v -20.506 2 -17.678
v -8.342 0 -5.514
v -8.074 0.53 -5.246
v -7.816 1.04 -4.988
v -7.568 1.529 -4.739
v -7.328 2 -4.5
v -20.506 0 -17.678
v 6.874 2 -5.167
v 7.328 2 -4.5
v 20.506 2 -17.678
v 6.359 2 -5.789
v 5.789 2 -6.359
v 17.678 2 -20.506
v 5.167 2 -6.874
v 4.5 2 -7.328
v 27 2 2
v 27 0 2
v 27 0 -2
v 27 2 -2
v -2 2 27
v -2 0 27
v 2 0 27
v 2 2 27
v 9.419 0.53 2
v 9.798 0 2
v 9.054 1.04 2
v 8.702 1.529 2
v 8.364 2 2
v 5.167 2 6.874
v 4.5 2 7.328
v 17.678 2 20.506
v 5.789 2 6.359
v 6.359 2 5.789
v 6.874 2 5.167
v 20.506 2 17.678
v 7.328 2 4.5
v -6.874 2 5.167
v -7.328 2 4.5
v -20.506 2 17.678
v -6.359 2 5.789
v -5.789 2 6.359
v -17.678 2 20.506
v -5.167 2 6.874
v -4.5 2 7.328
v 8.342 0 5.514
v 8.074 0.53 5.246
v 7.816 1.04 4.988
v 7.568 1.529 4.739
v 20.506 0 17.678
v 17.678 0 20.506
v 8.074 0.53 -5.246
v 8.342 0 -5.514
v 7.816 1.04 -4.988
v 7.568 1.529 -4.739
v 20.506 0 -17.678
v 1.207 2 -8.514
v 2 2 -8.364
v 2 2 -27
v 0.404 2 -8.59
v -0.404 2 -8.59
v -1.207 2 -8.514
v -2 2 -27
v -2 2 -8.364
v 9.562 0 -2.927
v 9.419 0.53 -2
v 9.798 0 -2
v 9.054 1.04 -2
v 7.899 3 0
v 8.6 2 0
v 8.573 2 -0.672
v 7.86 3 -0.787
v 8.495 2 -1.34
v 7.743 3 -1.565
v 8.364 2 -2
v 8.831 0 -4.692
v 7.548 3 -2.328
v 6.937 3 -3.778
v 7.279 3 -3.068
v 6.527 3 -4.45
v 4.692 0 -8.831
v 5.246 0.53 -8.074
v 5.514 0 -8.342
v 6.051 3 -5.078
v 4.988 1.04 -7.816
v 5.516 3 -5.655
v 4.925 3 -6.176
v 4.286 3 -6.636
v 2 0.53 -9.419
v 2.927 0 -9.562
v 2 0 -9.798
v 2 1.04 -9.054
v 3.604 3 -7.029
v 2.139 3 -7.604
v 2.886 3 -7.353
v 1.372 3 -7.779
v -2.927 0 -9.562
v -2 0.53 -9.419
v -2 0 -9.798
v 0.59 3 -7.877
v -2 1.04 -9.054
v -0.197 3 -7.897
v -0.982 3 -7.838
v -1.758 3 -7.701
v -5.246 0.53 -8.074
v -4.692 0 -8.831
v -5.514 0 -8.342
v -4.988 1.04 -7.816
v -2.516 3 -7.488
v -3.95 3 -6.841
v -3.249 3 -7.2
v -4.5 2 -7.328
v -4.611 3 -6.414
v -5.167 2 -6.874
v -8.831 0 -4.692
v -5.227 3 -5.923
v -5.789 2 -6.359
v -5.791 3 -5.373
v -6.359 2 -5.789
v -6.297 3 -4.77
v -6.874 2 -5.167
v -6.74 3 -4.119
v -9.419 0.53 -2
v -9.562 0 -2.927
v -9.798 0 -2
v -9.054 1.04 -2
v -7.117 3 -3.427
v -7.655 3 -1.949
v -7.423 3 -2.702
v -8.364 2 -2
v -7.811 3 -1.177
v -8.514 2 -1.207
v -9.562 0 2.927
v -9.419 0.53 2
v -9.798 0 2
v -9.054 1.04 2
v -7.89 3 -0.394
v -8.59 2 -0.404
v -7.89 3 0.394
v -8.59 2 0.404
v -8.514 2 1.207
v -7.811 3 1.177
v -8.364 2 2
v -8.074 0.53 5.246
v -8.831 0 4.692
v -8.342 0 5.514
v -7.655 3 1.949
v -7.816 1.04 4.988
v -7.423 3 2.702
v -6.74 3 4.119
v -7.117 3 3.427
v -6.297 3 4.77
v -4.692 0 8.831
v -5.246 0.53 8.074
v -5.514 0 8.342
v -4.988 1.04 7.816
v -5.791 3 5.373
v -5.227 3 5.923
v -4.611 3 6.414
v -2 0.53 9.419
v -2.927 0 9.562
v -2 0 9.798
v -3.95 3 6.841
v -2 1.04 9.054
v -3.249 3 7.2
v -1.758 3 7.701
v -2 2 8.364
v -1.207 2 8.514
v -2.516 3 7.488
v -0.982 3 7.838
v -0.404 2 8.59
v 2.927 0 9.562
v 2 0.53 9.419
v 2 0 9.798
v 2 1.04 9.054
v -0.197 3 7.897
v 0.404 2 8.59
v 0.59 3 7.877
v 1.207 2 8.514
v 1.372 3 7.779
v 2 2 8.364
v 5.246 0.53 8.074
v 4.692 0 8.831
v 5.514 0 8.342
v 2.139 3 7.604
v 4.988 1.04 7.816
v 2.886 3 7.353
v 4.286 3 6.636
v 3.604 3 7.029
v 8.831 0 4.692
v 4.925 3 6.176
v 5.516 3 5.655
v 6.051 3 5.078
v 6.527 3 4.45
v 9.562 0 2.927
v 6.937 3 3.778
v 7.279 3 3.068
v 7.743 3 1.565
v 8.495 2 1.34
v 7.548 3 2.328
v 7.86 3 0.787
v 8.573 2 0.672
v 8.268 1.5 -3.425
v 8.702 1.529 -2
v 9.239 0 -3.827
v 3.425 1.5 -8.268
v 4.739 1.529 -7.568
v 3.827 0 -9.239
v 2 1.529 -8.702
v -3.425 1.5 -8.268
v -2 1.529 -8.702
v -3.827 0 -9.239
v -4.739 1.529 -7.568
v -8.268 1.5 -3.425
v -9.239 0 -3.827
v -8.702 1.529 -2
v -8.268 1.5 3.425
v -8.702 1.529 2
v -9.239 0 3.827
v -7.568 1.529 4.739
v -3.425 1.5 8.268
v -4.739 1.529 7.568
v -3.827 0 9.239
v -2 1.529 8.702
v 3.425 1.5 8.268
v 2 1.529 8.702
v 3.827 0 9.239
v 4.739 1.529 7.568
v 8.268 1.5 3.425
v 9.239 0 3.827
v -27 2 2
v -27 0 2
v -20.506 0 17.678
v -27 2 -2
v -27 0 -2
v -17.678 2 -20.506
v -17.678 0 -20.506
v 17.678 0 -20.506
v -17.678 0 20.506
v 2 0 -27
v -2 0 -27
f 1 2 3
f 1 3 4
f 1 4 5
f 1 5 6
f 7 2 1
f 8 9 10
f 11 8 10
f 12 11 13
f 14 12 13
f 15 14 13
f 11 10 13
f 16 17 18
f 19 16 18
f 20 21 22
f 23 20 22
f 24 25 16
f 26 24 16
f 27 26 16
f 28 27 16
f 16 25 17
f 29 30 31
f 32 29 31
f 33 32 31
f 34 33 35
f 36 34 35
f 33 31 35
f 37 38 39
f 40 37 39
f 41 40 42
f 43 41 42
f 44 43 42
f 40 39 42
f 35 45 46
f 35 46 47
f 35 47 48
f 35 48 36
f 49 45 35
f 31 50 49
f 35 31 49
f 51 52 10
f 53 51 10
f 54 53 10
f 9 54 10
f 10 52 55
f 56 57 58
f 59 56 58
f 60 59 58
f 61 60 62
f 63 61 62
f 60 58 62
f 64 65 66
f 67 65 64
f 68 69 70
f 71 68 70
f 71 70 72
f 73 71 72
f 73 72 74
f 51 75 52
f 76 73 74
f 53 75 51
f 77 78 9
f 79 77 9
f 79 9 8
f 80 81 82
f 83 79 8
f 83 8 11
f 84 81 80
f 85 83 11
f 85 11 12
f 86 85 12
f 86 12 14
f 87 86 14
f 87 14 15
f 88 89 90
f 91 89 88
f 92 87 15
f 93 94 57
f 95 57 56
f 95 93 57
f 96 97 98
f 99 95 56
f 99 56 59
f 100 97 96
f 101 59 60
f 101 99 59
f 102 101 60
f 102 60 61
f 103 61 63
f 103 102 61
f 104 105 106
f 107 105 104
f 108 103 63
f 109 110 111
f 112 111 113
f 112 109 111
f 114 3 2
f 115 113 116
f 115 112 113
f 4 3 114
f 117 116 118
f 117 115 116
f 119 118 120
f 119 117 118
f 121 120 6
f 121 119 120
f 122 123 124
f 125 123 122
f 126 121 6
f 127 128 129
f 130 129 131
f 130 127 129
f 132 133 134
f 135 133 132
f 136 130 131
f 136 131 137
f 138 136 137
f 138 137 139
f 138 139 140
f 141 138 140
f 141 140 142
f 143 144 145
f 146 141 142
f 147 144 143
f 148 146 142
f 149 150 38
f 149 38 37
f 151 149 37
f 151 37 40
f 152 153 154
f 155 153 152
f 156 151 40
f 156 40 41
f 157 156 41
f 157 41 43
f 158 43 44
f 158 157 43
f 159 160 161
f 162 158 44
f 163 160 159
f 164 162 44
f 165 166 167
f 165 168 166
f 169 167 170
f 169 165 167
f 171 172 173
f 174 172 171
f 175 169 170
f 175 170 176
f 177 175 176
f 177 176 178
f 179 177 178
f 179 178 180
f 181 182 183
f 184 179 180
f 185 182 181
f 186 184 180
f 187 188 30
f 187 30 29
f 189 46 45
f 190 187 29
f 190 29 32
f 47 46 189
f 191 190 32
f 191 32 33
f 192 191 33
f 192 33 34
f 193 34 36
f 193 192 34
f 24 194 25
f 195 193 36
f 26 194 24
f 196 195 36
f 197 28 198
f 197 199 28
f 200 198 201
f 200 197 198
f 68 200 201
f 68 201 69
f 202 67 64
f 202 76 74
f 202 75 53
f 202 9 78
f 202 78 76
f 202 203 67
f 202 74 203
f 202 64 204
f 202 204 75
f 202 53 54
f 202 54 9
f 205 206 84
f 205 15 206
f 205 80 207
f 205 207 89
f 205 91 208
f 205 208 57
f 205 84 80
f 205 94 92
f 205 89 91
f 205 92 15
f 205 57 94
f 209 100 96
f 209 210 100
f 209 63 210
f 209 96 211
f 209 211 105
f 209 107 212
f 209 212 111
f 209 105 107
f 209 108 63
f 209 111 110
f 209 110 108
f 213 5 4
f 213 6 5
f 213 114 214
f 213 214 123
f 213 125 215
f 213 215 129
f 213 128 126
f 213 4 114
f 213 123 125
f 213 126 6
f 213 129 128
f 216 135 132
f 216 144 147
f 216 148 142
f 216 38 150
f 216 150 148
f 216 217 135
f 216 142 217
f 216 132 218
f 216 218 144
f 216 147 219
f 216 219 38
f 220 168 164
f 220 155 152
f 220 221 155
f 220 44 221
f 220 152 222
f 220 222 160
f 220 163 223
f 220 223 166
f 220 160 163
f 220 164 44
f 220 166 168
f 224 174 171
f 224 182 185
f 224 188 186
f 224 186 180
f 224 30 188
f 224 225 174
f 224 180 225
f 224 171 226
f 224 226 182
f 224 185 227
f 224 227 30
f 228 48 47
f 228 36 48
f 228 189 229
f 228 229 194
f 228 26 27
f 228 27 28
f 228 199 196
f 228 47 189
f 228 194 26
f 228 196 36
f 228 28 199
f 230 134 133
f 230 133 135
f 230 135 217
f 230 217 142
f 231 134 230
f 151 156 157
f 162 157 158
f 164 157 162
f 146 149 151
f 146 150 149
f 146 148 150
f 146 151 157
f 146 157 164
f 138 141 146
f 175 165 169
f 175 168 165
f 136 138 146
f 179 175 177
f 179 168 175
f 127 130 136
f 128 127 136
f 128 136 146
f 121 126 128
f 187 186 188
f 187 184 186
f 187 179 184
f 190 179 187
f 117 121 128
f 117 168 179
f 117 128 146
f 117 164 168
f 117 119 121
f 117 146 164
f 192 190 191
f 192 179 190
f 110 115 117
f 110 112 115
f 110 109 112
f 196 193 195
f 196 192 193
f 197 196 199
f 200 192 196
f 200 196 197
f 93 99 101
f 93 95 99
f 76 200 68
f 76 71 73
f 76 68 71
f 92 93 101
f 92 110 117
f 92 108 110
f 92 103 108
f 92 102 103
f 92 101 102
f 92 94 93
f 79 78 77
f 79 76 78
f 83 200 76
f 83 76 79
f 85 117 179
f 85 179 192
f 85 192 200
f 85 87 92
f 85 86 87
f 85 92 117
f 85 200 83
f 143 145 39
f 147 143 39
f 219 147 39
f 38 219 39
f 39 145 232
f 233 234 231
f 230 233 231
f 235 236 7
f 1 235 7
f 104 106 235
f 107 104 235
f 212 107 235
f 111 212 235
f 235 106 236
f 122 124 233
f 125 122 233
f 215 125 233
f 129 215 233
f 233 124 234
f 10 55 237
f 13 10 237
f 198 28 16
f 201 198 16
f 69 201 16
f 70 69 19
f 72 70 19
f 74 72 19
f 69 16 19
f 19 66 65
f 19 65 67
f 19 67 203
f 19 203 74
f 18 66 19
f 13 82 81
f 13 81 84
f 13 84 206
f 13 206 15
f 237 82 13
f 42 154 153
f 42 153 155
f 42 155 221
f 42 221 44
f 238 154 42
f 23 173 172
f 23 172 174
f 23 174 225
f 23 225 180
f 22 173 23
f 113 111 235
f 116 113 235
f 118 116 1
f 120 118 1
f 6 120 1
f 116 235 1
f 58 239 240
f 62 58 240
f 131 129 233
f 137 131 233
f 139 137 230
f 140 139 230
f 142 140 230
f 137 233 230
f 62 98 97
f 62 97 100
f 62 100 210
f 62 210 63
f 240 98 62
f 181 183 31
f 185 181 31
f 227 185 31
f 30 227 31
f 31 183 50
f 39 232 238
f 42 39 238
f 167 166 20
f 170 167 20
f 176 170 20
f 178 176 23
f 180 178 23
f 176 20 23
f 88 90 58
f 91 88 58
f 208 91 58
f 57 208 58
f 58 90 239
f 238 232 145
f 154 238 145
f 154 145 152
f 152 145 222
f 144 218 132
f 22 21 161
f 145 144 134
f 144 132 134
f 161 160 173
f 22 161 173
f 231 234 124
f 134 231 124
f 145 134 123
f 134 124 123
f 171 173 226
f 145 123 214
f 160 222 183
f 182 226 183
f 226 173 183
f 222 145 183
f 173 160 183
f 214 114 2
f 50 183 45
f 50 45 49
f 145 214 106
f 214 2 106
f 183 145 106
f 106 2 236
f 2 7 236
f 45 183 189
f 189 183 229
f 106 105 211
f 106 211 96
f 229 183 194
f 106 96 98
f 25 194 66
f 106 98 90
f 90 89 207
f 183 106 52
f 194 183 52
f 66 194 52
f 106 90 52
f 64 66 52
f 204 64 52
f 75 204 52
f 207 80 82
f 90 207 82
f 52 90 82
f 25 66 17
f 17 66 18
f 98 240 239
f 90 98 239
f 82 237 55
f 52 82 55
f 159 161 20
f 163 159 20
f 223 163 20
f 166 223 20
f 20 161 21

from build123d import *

# Parameters (mm, degrees)
SKETCH_1_R               = 10
EXTRUDE_1_DEPTH          = 3
EXTRUDE_1_TAPER          = 35
SKETCH_2_W               = 4
SKETCH_2_H               = 20
EXTRUDE_2_DEPTH          = 2
PATTERN_CIRCULAR_1_COUNT = 8


with BuildPart() as part:
    # Эскиз1 → Бобышка-Вытянуть1 (new body)
    with BuildSketch(Plane(origin=(0, 0, 0), x_dir=(1, 0, 0), z_dir=(0, 1, 0))):
        Circle(SKETCH_1_R)
    extrude(amount=EXTRUDE_1_DEPTH, taper=EXTRUDE_1_TAPER)

    # Эскиз2 → Бобышка-Вытянуть2 (add)
    with BuildSketch(Plane.XZ):
        with Locations((0, 17)):
            Rectangle(SKETCH_2_W, SKETCH_2_H)
    extrude_2 = extrude(amount=-EXTRUDE_2_DEPTH)

    # Круговой массив1: Бобышка-Вытянуть2 ×8 about axis
    pattern_circular_1_axis = Axis((0, 0, 0), (0, 1, 0))
    for i in range(1, PATTERN_CIRCULAR_1_COUNT):
        add(extrude_2.rotate(pattern_circular_1_axis, i * 360 / PATTERN_CIRCULAR_1_COUNT))


solid = part.part
